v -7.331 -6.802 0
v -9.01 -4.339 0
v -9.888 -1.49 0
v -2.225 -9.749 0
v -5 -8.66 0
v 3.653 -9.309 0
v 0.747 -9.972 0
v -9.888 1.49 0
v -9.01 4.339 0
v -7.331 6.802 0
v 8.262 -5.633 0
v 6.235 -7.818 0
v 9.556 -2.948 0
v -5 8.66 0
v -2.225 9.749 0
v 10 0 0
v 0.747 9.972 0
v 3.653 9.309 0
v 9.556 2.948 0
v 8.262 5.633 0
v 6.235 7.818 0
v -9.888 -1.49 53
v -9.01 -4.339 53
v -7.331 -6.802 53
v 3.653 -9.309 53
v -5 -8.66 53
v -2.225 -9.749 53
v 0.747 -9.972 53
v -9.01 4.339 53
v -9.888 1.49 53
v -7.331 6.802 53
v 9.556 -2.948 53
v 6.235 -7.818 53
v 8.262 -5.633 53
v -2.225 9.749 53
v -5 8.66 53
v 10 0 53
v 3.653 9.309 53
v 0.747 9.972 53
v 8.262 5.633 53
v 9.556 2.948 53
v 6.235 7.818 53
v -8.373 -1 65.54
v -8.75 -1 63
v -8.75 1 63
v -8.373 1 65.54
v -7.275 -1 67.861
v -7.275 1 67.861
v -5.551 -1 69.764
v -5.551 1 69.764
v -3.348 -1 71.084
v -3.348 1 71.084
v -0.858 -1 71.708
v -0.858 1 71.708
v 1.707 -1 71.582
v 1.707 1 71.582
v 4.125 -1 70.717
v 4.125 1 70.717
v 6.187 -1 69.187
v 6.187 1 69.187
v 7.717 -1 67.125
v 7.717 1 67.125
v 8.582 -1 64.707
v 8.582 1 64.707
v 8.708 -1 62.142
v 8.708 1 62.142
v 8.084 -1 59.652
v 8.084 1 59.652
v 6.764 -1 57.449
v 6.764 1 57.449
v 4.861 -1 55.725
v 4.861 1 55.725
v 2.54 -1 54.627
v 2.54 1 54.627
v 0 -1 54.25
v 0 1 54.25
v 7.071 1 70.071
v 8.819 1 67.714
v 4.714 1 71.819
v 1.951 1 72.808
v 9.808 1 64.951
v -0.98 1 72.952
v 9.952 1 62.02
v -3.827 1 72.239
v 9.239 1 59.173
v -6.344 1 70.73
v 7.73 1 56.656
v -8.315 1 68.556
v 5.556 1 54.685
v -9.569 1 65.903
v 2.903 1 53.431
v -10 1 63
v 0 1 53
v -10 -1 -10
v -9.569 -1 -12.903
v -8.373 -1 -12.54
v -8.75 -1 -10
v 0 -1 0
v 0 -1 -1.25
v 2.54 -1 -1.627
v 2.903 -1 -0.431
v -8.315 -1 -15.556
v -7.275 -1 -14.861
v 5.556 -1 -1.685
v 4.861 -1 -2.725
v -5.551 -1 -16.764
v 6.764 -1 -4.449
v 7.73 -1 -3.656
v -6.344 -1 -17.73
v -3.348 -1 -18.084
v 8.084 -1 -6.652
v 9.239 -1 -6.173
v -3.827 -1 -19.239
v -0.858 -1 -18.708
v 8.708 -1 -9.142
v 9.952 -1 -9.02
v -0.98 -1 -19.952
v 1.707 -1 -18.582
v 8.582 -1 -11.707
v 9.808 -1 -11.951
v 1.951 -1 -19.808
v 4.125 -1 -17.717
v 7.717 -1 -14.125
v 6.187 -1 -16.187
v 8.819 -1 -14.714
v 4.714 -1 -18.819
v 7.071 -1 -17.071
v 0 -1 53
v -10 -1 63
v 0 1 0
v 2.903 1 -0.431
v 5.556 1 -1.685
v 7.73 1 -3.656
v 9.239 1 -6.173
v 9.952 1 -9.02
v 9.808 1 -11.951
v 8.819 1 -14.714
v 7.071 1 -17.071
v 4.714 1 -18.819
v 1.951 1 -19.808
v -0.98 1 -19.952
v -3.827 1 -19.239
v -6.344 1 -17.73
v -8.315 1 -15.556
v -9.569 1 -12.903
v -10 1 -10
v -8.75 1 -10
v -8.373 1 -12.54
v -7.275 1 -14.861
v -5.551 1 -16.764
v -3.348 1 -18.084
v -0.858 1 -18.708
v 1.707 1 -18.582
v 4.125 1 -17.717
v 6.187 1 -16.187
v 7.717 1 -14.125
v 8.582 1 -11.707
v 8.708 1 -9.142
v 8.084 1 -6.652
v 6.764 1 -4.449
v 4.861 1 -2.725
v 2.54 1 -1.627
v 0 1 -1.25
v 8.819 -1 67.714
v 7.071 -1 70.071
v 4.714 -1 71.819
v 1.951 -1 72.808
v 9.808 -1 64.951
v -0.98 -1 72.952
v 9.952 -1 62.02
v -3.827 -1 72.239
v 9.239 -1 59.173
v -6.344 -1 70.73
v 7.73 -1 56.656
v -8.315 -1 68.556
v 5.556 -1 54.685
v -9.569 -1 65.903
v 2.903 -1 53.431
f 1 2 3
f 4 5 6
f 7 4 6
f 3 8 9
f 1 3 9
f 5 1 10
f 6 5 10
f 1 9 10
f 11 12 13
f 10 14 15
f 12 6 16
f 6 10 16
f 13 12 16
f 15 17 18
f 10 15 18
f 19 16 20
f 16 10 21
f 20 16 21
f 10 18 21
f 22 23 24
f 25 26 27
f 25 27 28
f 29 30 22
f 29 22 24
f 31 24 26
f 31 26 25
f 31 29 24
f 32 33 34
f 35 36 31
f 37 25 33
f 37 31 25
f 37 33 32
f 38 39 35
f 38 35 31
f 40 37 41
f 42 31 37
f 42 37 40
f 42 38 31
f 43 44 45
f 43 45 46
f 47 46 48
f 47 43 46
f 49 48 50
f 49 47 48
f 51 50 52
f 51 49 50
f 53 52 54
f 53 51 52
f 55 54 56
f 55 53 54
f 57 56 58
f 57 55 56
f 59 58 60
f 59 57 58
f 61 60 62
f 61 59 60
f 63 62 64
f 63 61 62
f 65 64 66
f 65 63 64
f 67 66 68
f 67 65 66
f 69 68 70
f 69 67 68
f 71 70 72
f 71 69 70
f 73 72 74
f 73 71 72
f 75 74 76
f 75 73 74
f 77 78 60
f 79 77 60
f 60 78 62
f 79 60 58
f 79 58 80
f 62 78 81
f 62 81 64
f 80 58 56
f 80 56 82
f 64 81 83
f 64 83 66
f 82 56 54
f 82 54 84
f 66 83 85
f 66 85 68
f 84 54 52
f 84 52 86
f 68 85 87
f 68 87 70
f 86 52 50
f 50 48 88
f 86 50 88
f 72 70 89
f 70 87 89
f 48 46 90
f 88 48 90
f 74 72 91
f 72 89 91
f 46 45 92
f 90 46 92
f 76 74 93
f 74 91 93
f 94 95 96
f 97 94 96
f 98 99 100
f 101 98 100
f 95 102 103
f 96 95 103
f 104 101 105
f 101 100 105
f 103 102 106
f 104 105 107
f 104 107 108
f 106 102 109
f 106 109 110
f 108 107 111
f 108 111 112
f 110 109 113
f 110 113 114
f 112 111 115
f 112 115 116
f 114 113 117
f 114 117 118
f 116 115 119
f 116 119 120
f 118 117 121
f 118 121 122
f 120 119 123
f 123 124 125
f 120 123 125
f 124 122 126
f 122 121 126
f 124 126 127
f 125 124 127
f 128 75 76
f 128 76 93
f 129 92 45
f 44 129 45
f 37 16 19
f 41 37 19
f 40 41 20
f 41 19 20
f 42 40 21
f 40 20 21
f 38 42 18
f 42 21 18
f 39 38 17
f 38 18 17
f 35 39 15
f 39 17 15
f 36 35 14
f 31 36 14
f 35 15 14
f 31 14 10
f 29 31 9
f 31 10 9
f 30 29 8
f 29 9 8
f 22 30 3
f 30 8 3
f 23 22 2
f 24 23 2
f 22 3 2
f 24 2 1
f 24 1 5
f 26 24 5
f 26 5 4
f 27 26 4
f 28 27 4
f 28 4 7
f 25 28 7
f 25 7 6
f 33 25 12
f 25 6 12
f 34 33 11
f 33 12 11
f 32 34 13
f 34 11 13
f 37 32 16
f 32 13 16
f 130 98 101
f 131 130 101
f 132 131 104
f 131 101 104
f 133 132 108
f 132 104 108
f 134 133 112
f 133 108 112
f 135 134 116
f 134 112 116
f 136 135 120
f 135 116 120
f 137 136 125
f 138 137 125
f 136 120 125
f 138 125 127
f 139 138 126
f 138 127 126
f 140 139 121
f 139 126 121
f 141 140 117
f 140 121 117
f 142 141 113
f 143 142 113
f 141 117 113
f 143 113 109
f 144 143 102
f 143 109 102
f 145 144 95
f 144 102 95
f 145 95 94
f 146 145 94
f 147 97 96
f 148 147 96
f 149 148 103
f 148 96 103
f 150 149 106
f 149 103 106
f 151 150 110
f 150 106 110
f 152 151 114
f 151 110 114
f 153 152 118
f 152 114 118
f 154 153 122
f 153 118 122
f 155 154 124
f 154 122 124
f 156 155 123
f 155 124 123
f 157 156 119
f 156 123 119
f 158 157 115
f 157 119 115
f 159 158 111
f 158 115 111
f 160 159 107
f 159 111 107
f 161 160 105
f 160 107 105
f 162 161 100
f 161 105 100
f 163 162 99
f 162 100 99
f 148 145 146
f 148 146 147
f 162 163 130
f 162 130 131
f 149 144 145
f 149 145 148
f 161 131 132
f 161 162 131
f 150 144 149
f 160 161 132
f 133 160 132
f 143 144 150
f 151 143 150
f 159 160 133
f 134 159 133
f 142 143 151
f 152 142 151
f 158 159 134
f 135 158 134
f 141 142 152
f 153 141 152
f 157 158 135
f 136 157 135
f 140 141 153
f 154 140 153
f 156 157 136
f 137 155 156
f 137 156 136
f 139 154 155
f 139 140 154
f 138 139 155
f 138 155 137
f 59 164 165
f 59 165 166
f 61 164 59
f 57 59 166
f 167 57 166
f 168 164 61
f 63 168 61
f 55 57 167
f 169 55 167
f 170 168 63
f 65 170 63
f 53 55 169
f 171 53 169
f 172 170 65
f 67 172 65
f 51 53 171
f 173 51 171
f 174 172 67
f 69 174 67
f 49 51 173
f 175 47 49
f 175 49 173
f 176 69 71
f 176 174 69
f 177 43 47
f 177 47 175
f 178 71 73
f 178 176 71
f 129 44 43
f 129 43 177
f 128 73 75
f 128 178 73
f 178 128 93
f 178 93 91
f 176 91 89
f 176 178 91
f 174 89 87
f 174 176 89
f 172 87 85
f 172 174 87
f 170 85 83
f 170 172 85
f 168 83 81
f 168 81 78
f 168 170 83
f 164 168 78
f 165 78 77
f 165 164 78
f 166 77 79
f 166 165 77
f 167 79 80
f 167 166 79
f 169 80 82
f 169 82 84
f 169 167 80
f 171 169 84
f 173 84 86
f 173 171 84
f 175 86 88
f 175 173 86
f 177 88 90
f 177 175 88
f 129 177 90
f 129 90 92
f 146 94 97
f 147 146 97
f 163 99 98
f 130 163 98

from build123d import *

# Parameters (mm, degrees)
SKETCH_1_R             = 10
EXTRUDE_1_DEPTH        = 53
EXTRUDE_2_DEPTH        = 1
EXTRUDE_2_DEPTH_BACK   = 1
EXTRUDE_2_2_DEPTH      = 1
EXTRUDE_2_2_DEPTH_BACK = 1


with BuildPart() as part:
    # 草图1 → 凸台-拉伸1 (new body)
    with BuildSketch(Plane.XY):
        Circle(SKETCH_1_R)
    extrude(amount=EXTRUDE_1_DEPTH)


with BuildPart() as body_2:
    # 草图5 → 凸台-拉伸2 (new, two sides: drawn at the far end of the back side and taken through both)
    with BuildSketch(Plane(origin=(0, 0, 0), x_dir=(1, 0, 0), z_dir=(0, 1, 0)).offset(-EXTRUDE_2_DEPTH_BACK)):
        with BuildLine():
            Line((-10, -63), (-8.75, -63))
            ThreePointArc((-8.75, -63), (6.187184335, -69.187184335), (0, -54.25))
            Line((0, -54.25), (0, -53))
            ThreePointArc((0, -53), (7.071067812, -70.071067812), (-10, -63))
        make_face()
    extrude(amount=EXTRUDE_2_DEPTH + EXTRUDE_2_DEPTH_BACK)


with BuildPart() as body_3:
    # 草图5 → Extrude 2 2 (new, two sides: drawn at the far end of the back side and taken through both)
    with BuildSketch(Plane(origin=(0, 0, 0), x_dir=(1, 0, 0), z_dir=(0, 1, 0)).offset(-EXTRUDE_2_2_DEPTH_BACK)):
        with BuildLine():
            Line((0, 1.25), (0, 0))
            ThreePointArc((0, 0), (7.071067812, 17.071067812), (-10, 10))
            Line((-10, 10), (-8.75, 10))
            ThreePointArc((-8.75, 10), (6.187184335, 16.187184335), (0, 1.25))
        make_face()
    extrude(amount=EXTRUDE_2_2_DEPTH + EXTRUDE_2_2_DEPTH_BACK)


solid = Compound([part.part, body_2.part, body_3.part])
